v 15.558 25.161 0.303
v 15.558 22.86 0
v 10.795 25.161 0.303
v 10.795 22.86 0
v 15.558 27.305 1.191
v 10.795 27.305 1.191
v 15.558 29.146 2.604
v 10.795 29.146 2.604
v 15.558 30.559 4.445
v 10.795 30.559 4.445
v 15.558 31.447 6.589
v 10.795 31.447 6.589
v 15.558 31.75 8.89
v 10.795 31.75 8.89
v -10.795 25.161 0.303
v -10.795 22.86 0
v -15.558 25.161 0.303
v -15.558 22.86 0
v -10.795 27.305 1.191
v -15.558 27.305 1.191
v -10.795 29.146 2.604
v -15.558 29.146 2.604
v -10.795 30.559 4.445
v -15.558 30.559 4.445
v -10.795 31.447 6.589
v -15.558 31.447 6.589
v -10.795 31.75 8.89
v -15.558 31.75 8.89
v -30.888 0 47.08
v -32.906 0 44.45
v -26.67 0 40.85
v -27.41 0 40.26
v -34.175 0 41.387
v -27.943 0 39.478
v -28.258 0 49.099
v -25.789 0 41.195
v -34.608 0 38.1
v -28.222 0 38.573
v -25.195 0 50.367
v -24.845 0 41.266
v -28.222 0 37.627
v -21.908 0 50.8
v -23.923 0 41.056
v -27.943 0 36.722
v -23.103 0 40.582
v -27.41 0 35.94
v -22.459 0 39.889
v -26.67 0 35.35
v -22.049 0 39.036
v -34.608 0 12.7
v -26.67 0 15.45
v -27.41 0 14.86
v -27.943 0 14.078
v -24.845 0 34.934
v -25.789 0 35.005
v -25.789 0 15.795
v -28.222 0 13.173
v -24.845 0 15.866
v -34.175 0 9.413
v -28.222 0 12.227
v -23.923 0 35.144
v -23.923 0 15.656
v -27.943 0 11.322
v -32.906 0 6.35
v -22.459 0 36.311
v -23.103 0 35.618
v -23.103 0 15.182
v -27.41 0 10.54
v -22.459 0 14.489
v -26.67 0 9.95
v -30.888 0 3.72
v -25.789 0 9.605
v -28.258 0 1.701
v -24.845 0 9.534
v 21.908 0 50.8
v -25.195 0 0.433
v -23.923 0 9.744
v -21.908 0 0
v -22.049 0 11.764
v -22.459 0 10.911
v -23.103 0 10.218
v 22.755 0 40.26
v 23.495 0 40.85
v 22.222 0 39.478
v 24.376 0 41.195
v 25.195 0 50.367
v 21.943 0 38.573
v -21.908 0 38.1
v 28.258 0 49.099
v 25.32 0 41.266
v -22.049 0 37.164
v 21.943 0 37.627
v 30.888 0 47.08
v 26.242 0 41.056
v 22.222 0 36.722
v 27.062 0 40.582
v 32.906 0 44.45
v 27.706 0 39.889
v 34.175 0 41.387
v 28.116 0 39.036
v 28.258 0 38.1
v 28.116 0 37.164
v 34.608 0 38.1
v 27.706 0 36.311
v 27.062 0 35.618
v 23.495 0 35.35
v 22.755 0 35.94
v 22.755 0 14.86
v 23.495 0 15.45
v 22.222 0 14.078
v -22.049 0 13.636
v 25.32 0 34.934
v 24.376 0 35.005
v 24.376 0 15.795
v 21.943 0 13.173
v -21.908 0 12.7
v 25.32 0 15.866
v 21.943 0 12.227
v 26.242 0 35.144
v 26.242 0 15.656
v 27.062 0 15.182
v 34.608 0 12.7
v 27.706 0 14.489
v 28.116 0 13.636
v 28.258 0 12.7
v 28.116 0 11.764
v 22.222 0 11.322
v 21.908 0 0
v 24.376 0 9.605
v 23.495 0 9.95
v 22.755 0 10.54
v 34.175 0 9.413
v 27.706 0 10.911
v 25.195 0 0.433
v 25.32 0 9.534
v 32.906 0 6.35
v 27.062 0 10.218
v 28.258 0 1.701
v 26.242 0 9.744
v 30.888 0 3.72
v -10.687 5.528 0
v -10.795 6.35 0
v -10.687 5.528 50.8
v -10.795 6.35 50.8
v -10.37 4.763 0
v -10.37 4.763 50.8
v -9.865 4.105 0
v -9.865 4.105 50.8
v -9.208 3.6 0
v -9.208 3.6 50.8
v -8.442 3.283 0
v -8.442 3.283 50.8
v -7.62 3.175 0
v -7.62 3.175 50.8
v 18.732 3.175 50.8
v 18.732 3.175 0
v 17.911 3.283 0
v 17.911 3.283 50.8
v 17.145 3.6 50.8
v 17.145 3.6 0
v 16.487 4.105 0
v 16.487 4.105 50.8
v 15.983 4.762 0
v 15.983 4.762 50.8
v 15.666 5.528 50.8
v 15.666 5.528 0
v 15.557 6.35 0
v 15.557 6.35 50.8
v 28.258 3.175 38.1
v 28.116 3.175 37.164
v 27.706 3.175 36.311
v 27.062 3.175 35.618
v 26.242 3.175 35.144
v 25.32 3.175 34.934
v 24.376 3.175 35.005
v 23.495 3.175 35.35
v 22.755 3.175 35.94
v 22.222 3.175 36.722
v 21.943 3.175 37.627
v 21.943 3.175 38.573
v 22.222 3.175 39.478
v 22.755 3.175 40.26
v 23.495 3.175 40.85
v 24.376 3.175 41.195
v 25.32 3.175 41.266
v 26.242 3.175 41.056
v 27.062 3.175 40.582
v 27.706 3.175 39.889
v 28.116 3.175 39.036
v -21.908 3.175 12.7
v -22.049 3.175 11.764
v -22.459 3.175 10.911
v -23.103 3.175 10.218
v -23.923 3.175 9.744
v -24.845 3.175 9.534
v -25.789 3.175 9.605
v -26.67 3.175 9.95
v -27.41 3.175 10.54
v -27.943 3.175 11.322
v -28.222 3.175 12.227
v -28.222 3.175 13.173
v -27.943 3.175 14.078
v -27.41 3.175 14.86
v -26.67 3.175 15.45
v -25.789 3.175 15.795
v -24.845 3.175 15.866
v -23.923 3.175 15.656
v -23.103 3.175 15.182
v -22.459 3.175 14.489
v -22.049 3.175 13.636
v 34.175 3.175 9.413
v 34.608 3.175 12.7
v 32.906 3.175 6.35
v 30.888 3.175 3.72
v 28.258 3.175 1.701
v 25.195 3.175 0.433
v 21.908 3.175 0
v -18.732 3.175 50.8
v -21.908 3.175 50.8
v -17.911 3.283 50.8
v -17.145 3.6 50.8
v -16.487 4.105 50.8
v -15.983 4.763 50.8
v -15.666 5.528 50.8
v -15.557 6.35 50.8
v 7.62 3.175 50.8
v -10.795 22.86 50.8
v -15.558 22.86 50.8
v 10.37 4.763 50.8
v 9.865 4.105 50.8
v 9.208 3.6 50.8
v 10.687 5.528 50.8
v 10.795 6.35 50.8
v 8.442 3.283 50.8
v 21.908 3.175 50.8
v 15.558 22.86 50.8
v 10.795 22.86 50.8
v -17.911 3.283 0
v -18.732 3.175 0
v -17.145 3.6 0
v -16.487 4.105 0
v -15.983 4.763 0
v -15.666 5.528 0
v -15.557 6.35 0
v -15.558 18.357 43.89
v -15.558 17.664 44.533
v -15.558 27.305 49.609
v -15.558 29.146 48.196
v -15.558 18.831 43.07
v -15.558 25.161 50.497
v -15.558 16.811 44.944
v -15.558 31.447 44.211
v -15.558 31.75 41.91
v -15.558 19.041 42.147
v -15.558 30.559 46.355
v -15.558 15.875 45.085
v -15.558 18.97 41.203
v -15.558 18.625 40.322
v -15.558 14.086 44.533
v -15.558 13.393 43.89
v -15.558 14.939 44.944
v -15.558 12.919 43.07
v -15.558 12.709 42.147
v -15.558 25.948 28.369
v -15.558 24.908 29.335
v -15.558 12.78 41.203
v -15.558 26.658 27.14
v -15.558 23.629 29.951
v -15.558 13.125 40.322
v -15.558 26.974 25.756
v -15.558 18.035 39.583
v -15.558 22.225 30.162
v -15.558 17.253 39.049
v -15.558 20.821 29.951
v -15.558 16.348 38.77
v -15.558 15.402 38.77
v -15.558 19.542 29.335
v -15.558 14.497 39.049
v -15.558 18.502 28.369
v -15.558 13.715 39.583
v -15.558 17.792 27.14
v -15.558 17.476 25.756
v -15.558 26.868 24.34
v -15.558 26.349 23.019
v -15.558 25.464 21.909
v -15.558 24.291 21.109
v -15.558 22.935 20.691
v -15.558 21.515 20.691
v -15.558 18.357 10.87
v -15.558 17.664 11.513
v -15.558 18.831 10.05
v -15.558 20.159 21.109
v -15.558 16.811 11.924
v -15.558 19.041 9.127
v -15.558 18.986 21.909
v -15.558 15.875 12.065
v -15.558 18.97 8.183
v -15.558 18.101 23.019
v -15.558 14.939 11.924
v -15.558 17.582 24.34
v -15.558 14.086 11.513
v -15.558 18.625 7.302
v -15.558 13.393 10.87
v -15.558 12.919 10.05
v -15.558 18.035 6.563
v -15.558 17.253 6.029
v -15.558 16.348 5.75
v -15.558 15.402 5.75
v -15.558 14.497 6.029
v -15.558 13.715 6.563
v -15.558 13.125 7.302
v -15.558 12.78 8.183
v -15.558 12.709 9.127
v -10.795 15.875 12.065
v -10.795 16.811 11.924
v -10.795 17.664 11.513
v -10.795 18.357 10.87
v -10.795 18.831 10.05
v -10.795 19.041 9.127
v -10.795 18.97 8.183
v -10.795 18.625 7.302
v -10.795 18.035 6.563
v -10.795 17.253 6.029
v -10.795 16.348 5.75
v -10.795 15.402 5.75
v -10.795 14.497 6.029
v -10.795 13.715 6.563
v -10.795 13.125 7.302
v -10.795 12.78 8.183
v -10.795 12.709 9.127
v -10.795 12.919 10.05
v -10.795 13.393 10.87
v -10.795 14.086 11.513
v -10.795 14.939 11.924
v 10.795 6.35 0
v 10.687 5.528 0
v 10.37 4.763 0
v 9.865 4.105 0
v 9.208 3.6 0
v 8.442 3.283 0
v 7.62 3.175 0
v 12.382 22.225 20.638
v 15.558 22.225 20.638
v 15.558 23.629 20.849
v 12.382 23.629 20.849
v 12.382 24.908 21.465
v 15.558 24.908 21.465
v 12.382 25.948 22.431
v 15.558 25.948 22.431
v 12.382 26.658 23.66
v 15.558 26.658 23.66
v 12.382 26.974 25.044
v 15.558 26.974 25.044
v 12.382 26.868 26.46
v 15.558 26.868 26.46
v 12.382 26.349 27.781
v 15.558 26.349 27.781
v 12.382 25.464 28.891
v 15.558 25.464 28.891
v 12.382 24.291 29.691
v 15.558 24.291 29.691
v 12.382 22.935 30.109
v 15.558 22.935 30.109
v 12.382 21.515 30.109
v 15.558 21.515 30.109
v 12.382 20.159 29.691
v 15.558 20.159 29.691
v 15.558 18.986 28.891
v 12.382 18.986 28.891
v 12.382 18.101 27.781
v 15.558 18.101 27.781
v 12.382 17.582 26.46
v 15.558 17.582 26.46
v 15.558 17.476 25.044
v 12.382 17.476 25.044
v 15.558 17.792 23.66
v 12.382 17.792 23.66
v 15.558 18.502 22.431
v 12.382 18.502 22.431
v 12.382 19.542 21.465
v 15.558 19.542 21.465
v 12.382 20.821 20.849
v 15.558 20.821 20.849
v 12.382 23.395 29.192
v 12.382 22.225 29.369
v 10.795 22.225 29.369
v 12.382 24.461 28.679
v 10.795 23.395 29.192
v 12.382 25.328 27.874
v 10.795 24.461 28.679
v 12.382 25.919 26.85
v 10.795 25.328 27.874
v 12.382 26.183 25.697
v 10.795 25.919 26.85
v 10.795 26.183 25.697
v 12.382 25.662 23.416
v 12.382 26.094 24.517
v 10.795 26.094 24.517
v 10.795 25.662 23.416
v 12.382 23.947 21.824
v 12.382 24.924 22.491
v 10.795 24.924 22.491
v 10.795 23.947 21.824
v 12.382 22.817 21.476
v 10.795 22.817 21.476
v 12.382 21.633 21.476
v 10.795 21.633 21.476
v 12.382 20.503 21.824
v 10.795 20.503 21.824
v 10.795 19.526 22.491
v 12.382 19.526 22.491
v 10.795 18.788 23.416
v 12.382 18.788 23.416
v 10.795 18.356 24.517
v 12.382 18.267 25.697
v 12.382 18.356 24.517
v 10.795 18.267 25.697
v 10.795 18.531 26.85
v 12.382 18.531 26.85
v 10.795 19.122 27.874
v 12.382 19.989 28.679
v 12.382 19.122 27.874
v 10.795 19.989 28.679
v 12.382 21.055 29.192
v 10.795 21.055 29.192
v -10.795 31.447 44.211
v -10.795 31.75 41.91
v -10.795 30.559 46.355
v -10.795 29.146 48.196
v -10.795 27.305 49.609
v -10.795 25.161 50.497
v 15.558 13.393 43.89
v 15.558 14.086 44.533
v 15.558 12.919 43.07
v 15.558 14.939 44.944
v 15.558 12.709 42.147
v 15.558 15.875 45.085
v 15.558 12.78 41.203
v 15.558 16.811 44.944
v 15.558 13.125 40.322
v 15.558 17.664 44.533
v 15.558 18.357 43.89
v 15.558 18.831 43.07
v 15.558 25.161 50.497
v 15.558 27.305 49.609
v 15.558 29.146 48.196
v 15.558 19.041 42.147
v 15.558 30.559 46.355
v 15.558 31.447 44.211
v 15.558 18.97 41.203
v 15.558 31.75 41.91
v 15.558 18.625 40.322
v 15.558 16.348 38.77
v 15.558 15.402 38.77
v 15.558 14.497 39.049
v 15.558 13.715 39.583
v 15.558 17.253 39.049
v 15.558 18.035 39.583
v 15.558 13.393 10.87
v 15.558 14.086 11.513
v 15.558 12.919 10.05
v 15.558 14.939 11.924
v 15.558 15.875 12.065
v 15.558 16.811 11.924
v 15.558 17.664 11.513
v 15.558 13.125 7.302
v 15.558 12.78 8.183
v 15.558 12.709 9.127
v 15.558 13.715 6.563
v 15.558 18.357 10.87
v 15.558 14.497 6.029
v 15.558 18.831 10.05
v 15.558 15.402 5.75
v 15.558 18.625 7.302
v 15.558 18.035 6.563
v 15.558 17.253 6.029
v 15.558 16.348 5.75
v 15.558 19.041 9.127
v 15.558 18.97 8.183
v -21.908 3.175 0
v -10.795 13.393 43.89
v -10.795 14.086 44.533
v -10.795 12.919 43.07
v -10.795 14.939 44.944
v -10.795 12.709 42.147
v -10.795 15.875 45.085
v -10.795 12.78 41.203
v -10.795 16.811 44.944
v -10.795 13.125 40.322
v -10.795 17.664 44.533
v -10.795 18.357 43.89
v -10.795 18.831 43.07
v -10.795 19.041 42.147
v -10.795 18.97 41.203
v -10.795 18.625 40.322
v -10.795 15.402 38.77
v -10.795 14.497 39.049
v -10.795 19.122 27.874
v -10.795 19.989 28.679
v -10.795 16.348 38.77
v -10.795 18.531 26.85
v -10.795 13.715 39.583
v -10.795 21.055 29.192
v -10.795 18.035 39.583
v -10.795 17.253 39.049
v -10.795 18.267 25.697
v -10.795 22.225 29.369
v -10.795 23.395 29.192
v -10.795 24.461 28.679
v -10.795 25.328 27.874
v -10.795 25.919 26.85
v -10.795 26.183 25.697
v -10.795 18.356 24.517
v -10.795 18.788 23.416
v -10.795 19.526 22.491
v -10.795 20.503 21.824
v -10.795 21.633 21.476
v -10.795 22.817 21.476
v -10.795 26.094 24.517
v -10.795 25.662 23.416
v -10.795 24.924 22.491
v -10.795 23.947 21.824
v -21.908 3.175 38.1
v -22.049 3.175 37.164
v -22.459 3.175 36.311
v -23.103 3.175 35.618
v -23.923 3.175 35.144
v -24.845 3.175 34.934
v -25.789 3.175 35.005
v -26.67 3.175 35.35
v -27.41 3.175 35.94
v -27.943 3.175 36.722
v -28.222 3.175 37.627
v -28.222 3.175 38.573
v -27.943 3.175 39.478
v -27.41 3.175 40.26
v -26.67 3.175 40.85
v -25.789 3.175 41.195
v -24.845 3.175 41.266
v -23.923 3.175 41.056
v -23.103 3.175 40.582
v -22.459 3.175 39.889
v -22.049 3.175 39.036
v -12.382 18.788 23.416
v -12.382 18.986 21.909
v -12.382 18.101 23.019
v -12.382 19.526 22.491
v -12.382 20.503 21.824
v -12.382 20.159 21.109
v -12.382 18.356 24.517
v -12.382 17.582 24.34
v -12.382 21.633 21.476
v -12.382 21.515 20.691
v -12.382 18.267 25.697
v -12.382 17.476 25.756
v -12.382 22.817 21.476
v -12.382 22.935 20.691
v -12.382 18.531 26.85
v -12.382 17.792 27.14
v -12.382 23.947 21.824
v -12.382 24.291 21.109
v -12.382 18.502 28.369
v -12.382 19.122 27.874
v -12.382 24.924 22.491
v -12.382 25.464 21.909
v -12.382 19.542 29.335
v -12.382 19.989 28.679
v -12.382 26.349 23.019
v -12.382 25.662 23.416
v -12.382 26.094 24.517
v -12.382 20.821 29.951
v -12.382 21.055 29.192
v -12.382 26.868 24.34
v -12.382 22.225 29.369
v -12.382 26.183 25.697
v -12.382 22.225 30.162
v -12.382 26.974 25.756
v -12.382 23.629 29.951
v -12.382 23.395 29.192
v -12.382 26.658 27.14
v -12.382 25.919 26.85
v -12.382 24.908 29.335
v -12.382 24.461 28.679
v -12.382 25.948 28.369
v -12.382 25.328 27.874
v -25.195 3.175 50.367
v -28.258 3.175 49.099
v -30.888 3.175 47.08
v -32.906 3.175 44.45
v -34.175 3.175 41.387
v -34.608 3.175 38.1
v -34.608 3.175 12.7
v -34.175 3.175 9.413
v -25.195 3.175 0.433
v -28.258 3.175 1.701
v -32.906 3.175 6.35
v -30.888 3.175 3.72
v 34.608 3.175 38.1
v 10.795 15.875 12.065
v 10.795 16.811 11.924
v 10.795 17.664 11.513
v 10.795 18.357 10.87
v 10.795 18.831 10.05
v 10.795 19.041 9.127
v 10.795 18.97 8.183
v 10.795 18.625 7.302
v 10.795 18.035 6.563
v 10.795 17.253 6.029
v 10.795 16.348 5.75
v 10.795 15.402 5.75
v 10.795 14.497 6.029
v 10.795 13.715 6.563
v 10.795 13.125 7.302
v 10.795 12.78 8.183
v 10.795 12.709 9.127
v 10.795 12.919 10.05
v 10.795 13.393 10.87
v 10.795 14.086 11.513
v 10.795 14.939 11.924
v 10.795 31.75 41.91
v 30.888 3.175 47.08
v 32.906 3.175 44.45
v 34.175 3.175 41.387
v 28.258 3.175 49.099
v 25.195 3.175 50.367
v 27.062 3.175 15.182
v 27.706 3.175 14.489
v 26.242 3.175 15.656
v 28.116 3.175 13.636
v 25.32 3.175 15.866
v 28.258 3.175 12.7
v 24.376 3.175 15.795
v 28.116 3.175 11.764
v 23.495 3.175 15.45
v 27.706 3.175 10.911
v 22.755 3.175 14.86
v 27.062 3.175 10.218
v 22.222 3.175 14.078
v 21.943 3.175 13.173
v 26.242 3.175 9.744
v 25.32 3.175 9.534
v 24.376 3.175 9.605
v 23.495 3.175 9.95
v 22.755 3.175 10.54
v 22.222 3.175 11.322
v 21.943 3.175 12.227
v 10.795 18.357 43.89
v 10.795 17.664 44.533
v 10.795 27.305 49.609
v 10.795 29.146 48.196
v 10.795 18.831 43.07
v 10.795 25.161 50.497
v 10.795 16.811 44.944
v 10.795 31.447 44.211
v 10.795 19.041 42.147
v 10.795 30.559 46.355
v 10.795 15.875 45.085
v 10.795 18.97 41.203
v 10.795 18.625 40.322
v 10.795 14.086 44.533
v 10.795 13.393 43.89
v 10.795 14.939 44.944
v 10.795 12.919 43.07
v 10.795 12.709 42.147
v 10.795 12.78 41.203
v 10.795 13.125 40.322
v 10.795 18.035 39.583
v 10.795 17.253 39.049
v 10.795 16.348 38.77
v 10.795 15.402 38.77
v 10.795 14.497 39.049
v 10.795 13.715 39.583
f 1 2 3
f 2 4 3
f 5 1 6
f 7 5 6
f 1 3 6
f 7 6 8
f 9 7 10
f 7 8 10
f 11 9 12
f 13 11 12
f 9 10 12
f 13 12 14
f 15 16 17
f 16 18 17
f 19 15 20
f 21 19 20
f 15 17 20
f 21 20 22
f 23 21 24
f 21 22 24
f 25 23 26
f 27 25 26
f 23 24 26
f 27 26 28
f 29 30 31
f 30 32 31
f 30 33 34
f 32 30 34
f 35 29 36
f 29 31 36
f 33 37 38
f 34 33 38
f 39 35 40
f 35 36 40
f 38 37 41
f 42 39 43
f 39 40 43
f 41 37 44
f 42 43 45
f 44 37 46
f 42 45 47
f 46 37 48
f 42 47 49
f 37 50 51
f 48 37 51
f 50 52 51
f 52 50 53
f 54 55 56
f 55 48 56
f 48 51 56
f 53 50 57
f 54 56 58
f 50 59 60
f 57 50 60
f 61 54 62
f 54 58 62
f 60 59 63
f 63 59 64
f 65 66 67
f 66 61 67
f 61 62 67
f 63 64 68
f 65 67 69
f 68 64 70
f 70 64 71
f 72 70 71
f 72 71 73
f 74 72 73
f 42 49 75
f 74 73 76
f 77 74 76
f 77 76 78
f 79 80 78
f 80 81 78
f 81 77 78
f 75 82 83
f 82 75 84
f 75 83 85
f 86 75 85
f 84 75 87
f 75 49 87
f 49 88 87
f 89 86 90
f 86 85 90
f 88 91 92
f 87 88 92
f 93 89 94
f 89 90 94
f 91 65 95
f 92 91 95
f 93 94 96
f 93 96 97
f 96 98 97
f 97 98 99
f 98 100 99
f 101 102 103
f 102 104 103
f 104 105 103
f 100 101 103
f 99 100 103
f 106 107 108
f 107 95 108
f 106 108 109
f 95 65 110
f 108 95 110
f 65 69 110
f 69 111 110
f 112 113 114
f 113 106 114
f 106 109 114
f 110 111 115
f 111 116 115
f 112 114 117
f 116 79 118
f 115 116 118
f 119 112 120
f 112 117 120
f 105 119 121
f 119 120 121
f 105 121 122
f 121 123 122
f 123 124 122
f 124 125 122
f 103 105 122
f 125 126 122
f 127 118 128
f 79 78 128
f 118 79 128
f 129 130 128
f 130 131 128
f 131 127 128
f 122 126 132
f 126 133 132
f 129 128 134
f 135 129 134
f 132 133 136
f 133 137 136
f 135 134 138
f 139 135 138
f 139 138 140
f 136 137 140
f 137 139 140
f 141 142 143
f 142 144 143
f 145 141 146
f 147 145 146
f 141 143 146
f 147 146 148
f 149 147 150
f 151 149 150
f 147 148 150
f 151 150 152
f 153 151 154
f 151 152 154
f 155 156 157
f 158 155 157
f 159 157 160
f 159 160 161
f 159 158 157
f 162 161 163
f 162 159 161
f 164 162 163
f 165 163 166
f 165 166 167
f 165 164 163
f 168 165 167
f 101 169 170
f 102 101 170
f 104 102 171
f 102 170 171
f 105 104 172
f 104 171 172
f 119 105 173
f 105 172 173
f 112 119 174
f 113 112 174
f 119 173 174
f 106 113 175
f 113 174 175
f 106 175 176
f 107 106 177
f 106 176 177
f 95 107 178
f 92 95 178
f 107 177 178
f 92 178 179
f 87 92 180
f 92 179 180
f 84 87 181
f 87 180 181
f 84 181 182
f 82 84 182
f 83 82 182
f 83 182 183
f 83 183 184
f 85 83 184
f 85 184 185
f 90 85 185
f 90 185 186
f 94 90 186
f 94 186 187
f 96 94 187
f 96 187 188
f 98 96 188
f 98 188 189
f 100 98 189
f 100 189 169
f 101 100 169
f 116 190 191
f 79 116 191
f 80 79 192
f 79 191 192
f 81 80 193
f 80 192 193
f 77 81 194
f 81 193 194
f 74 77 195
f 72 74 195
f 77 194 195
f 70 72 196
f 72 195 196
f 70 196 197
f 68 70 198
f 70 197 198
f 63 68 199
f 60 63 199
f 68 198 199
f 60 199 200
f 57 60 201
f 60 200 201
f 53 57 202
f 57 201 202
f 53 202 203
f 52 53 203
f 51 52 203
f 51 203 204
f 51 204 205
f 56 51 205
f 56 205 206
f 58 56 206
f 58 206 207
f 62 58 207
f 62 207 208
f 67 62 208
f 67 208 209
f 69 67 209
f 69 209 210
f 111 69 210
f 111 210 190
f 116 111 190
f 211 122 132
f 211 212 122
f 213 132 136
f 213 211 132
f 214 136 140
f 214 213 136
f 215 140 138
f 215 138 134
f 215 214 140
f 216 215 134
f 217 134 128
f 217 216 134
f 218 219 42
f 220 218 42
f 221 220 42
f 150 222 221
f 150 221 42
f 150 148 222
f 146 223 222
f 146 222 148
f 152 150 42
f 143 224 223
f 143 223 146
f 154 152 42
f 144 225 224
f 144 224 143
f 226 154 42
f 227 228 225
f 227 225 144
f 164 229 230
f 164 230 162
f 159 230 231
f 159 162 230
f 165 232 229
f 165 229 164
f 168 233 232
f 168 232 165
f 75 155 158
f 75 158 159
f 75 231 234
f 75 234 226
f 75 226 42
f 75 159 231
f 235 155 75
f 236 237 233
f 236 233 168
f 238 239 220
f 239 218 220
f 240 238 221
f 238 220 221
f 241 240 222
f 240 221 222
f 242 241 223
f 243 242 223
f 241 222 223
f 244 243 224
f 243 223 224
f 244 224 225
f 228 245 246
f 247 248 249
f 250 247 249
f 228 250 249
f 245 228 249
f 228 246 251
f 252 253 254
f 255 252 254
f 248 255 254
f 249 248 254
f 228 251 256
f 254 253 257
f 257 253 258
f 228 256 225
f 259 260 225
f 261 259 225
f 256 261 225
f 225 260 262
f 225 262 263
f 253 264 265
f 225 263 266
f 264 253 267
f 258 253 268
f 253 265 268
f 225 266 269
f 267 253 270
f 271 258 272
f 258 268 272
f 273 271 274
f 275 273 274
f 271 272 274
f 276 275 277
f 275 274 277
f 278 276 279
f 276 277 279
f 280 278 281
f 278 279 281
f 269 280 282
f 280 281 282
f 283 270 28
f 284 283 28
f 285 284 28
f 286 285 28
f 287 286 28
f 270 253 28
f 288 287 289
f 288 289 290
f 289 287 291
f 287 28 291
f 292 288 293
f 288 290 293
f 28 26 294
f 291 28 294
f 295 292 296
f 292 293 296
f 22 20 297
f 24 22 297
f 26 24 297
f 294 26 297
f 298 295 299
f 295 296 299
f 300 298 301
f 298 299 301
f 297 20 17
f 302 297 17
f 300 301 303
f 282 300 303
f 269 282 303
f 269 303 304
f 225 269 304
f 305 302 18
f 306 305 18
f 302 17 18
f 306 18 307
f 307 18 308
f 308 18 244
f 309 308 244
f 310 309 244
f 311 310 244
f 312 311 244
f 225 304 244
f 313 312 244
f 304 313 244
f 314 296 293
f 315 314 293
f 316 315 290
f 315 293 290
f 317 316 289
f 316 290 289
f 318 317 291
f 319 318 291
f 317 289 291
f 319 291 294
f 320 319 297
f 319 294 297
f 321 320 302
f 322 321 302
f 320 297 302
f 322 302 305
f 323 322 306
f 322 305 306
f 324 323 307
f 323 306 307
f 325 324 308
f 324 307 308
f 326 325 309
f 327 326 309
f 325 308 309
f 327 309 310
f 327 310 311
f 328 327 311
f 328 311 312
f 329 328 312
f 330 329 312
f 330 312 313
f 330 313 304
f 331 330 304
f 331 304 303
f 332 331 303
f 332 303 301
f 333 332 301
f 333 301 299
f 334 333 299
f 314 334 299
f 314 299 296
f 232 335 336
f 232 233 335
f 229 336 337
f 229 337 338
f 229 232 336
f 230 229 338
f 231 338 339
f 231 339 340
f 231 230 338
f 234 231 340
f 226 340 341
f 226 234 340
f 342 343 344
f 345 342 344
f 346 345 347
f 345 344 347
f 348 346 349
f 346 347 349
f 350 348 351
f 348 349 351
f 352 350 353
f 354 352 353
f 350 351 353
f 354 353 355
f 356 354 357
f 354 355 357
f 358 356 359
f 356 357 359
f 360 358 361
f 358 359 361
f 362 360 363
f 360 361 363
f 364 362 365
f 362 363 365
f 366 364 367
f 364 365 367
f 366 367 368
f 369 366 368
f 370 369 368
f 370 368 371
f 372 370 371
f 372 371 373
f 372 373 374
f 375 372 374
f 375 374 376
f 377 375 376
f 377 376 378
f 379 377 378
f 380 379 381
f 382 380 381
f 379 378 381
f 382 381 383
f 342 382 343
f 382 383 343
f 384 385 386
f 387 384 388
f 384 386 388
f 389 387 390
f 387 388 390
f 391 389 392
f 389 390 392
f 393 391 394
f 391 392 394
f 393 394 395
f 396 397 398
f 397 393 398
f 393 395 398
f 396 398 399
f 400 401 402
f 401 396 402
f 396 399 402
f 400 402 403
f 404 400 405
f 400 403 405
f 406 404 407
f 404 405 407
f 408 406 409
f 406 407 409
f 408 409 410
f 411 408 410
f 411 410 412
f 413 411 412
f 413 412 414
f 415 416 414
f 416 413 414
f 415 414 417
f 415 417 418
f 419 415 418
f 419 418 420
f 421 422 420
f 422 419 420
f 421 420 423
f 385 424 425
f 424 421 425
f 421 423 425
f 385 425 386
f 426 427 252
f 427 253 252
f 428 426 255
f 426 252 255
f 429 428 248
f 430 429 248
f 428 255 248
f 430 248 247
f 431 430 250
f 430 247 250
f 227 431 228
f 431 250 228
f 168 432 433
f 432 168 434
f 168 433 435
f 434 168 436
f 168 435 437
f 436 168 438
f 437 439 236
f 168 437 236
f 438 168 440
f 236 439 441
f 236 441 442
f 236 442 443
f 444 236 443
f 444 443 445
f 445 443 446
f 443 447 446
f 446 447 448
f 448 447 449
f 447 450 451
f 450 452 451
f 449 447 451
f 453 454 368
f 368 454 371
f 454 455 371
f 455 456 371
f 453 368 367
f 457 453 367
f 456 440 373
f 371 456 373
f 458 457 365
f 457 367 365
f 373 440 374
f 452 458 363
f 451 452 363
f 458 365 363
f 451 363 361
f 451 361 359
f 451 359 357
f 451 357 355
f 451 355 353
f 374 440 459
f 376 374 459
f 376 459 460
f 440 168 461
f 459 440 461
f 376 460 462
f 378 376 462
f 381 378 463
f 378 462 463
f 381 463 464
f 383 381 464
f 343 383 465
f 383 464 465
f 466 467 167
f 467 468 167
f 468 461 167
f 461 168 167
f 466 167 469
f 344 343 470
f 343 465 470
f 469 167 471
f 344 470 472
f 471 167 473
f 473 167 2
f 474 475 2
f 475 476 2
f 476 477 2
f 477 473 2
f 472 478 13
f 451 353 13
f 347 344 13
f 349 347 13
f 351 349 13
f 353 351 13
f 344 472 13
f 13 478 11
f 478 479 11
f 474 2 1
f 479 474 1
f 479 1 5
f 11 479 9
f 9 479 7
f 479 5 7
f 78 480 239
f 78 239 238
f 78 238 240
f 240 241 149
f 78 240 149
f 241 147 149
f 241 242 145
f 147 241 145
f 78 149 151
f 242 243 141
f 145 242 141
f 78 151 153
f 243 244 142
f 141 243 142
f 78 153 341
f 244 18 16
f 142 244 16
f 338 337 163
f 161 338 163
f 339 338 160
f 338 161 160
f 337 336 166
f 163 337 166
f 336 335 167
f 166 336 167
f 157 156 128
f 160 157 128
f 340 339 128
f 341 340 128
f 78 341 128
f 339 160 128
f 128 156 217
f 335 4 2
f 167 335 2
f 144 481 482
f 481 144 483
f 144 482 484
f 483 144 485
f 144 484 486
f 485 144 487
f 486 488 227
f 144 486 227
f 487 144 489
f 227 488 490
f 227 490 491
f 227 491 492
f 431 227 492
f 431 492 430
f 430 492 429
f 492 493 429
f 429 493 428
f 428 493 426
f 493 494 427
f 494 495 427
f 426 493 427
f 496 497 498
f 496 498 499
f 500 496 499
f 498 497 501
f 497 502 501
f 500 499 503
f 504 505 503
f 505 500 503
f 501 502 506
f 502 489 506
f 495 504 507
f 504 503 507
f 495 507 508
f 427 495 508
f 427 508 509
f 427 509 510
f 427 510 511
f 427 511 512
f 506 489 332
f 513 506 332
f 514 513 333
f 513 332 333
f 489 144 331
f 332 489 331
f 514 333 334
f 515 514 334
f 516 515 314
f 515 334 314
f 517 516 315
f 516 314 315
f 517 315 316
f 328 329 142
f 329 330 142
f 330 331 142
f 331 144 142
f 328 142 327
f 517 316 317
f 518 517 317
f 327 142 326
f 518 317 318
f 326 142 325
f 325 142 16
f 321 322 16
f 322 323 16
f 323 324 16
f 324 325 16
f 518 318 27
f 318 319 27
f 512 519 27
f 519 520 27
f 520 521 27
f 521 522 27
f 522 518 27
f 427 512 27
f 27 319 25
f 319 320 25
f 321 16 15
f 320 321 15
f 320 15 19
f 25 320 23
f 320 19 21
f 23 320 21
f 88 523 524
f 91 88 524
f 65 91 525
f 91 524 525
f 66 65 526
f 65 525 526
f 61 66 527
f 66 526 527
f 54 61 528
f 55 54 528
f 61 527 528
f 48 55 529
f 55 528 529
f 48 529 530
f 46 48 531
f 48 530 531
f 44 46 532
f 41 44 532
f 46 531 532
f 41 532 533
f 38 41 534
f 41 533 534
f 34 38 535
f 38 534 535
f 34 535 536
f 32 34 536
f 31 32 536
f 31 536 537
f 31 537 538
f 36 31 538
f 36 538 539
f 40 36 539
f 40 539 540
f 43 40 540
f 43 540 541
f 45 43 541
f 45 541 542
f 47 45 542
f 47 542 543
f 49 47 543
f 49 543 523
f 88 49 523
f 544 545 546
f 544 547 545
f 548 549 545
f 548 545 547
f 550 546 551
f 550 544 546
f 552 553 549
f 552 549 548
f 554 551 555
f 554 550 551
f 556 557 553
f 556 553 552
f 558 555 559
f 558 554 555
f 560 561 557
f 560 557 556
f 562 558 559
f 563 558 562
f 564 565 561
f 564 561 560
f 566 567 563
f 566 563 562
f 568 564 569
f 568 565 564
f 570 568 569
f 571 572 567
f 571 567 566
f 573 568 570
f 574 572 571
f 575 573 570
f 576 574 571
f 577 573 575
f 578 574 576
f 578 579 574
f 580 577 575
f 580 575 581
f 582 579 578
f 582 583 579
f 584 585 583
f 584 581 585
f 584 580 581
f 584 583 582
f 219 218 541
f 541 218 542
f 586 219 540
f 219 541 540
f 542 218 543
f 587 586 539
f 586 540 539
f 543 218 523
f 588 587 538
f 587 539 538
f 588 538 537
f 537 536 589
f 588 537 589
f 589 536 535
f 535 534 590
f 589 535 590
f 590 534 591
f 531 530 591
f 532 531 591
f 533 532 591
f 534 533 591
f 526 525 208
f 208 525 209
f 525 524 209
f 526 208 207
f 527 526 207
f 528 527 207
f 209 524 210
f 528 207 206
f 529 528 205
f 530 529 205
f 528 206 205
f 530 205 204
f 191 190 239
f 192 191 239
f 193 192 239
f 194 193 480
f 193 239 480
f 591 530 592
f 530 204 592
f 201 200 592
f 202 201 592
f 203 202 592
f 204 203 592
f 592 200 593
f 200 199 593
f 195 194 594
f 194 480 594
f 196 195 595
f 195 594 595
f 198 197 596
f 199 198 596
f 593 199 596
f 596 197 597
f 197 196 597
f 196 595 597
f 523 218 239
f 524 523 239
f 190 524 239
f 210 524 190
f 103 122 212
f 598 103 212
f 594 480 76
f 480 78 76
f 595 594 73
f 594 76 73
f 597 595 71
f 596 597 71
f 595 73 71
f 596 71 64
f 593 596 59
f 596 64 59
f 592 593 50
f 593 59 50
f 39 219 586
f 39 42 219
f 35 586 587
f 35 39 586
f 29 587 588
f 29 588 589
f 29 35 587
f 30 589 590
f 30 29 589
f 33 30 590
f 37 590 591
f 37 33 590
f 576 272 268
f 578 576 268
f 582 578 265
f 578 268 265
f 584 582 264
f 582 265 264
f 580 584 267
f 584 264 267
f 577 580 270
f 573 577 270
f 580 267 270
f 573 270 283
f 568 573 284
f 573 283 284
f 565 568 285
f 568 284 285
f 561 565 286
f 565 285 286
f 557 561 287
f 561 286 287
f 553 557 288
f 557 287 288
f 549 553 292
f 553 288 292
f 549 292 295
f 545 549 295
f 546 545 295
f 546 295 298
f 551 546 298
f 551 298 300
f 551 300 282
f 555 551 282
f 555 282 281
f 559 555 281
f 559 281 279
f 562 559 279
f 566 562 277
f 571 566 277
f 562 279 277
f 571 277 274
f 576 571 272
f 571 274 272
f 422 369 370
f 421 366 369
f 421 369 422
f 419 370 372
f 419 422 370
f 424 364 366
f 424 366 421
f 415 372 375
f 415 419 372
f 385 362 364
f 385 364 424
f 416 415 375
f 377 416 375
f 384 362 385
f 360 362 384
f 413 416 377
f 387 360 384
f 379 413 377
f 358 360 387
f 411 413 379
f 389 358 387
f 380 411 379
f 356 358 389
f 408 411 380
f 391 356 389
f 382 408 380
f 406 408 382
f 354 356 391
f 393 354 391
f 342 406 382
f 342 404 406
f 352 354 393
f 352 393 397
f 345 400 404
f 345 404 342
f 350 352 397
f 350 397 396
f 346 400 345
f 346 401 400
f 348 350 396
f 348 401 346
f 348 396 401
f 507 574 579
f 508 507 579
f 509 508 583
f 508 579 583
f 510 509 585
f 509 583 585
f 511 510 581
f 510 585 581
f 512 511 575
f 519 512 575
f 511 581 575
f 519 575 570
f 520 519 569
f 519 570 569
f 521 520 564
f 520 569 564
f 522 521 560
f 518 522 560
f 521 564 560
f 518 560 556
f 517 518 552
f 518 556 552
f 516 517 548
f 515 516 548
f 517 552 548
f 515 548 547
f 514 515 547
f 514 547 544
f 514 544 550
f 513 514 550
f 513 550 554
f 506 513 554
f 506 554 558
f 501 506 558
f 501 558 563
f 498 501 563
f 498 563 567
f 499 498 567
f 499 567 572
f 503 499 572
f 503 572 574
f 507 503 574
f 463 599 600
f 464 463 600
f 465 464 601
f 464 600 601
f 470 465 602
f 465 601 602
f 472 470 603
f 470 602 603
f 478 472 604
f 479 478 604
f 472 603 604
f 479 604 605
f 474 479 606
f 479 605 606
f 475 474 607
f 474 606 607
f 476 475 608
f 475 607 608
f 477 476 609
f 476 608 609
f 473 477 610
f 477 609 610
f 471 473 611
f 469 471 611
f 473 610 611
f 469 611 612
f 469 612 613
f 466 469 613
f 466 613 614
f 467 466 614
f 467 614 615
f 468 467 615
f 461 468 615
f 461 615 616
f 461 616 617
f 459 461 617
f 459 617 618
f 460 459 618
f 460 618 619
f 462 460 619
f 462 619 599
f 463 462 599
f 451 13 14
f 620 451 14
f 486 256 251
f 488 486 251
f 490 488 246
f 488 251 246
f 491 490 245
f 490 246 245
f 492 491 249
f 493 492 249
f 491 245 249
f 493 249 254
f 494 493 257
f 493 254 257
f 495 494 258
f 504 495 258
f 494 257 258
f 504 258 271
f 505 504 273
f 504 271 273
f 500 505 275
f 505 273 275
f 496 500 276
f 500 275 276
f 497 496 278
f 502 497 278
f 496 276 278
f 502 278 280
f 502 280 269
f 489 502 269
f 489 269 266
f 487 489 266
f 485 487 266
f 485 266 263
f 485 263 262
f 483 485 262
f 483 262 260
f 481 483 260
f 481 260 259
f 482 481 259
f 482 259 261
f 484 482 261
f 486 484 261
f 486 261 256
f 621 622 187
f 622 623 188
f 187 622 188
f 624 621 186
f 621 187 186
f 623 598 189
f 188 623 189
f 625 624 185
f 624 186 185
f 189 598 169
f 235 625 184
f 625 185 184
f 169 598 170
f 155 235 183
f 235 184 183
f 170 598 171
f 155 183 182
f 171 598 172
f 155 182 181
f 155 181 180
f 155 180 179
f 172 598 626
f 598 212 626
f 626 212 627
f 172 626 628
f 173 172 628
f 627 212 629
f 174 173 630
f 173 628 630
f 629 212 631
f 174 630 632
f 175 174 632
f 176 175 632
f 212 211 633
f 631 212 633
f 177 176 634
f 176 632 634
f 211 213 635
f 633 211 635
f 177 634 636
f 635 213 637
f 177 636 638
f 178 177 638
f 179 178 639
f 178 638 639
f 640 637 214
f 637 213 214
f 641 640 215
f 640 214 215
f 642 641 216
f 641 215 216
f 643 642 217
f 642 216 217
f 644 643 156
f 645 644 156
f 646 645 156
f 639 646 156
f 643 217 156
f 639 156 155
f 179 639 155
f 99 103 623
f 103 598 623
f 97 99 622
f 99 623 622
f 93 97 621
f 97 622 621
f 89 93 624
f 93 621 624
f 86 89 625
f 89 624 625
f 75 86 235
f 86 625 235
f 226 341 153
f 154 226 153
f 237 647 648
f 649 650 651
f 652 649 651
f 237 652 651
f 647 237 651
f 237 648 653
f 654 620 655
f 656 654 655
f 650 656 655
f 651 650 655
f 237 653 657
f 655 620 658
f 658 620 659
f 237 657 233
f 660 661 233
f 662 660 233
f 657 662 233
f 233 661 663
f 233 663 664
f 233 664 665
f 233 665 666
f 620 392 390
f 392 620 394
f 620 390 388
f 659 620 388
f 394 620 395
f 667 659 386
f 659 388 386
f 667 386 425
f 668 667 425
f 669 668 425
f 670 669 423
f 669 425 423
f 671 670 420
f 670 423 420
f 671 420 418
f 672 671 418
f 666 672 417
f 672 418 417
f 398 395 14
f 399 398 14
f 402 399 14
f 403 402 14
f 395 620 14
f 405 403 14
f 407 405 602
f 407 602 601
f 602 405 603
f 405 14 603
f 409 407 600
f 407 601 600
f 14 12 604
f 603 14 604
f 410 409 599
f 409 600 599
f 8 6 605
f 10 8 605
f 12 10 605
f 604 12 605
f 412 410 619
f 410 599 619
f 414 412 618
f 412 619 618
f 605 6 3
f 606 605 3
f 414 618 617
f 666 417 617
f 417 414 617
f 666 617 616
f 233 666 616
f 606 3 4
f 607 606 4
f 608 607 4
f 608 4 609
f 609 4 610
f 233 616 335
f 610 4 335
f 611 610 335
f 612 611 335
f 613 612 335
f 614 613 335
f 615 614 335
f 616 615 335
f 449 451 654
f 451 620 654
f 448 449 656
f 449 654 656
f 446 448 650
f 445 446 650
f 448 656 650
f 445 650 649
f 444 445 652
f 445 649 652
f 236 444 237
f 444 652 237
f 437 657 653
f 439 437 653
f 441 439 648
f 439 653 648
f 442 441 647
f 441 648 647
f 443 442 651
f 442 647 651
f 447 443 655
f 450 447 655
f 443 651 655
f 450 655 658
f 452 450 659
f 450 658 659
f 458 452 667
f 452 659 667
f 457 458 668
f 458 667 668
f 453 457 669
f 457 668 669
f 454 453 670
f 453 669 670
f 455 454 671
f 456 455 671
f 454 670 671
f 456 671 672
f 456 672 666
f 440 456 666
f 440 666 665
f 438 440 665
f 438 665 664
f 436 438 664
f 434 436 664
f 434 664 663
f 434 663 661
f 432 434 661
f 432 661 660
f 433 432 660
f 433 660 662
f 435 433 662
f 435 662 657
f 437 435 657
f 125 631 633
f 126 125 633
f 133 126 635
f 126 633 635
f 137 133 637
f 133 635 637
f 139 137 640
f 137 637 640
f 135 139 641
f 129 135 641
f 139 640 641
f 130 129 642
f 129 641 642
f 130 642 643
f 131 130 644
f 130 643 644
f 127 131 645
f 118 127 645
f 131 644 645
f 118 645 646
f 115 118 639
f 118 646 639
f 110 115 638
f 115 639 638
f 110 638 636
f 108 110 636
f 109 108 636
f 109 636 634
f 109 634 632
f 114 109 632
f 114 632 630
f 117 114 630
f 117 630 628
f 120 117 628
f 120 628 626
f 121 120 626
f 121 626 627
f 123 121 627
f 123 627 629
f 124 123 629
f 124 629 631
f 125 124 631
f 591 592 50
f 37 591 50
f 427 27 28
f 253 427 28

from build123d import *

# Parameters (mm, degrees)
BOSS_EXTRUDE2_DEPTH = 50.8
SKETCH4_R           = 3.175
SKETCH4_R_2         = 3.96875
CUT_EXTRUDE1_DEPTH  = 79.13596947
SKETCH5_R           = 3.175
CUT_EXTRUDE2_DEPTH  = 68.785320544
SKETCH4_3_R         = 4.7625
SKETCH4_3_R_2       = 3.96875
CUT_EXTRUDE3_DEPTH  = 3.175
CUT_EXTRUDE4_START  = -3.175
SKETCH6_R           = 4.7625
SKETCH6_R_2         = 3.96875
CUT_EXTRUDE4_DEPTH  = 3.175
FILLET1_R           = 12.7
FILLET2_R           = 3.175
FILLET3_R           = 8.89


with BuildPart() as part:
    # Sketch3 → Boss-Extrude2 (new body)
    with BuildSketch(Plane.XY):
        Polygon((-34.6075, 0), (34.6075, 0), (34.6075, 3.175), (15.5575, 3.175), (15.5575, 31.75), (10.795, 31.75), (10.795, 3.175), (-10.795, 3.175), (-10.795, 31.75), (-15.5575, 31.75), (-15.5575, 3.175), (-34.6075, 3.175), align=None)
    extrude(amount=BOSS_EXTRUDE2_DEPTH)

    # Sketch4 → Cut-Extrude1 (cut, through all)
    with BuildSketch(Plane.ZY.offset(15.5575)):
        with Locations((8.89, 15.875)):
            Circle(SKETCH4_R)
        with Locations((41.91, 15.875)):
            Circle(SKETCH4_R)
        with Locations((25.4, 22.225)):
            Circle(SKETCH4_R_2)
    extrude(amount=-CUT_EXTRUDE1_DEPTH, mode=Mode.SUBTRACT)

    # Sketch5 → Cut-Extrude2 (cut, through all)
    with BuildSketch(Plane(origin=(0, 3.175, 0), x_dir=(1, 0, 0), z_dir=(0, 1, 0))):
        with Locations((-25.0825, -12.7)):
            Circle(SKETCH5_R)
        with Locations((-25.0825, -38.1)):
            Circle(SKETCH5_R)
        with Locations((25.0825, -12.7)):
            Circle(SKETCH5_R)
        with Locations((25.0825, -38.1)):
            Circle(SKETCH5_R)
    extrude(amount=-CUT_EXTRUDE2_DEPTH, mode=Mode.SUBTRACT)

    # Sketch4<3> → Cut-Extrude3 (cut)
    with BuildSketch(Plane.ZY.offset(15.5575)):
        with Locations((25.4, 22.225)):
            Circle(SKETCH4_3_R)
        with Locations((25.4, 22.225)):
            Circle(SKETCH4_3_R_2, mode=Mode.SUBTRACT)
    extrude(amount=-CUT_EXTRUDE3_DEPTH, mode=Mode.SUBTRACT)

    # Sketch6 → Cut-Extrude4 (cut)
    with BuildSketch(Plane(origin=(15.5575, 0, 0), x_dir=(0, 0, -1), z_dir=(1, 0, 0)).offset(CUT_EXTRUDE4_START)):
        with Locations((-25.4, 22.225)):
            Circle(SKETCH6_R)
        with Locations((-25.4, 22.225)):
            Circle(SKETCH6_R_2, mode=Mode.SUBTRACT)
    extrude(amount=CUT_EXTRUDE4_DEPTH, mode=Mode.SUBTRACT)

    # Fillet1
    fillet1_edges = [part.edges().sort_by_distance(p)[0] for p in [
        (34.6075, 1.5875, 0),
        (34.6075, 1.5875, 50.8),
        (-34.6075, 1.5875, 50.8),
        (-34.6075, 1.5875, 0),
    ]]
    fillet(fillet1_edges, radius=FILLET1_R)

    # Fillet2
    fillet2_edges = [part.edges().sort_by_distance(p)[0] for p in [
        (15.5575, 3.175, 25.4),
        (10.795, 3.175, 25.4),
        (-10.795, 3.175, 25.4),
        (-15.5575, 3.175, 25.4),
    ]]
    fillet(fillet2_edges, radius=FILLET2_R)

    # Fillet3
    fillet3_edges = [part.edges().sort_by_distance(p)[0] for p in [
        (-13.17625, 31.75, 50.8),
        (13.17625, 31.75, 50.8),
        (13.17625, 31.75, 0),
        (-13.17625, 31.75, 0),
    ]]
    fillet(fillet3_edges, radius=FILLET3_R)


solid = part.part
